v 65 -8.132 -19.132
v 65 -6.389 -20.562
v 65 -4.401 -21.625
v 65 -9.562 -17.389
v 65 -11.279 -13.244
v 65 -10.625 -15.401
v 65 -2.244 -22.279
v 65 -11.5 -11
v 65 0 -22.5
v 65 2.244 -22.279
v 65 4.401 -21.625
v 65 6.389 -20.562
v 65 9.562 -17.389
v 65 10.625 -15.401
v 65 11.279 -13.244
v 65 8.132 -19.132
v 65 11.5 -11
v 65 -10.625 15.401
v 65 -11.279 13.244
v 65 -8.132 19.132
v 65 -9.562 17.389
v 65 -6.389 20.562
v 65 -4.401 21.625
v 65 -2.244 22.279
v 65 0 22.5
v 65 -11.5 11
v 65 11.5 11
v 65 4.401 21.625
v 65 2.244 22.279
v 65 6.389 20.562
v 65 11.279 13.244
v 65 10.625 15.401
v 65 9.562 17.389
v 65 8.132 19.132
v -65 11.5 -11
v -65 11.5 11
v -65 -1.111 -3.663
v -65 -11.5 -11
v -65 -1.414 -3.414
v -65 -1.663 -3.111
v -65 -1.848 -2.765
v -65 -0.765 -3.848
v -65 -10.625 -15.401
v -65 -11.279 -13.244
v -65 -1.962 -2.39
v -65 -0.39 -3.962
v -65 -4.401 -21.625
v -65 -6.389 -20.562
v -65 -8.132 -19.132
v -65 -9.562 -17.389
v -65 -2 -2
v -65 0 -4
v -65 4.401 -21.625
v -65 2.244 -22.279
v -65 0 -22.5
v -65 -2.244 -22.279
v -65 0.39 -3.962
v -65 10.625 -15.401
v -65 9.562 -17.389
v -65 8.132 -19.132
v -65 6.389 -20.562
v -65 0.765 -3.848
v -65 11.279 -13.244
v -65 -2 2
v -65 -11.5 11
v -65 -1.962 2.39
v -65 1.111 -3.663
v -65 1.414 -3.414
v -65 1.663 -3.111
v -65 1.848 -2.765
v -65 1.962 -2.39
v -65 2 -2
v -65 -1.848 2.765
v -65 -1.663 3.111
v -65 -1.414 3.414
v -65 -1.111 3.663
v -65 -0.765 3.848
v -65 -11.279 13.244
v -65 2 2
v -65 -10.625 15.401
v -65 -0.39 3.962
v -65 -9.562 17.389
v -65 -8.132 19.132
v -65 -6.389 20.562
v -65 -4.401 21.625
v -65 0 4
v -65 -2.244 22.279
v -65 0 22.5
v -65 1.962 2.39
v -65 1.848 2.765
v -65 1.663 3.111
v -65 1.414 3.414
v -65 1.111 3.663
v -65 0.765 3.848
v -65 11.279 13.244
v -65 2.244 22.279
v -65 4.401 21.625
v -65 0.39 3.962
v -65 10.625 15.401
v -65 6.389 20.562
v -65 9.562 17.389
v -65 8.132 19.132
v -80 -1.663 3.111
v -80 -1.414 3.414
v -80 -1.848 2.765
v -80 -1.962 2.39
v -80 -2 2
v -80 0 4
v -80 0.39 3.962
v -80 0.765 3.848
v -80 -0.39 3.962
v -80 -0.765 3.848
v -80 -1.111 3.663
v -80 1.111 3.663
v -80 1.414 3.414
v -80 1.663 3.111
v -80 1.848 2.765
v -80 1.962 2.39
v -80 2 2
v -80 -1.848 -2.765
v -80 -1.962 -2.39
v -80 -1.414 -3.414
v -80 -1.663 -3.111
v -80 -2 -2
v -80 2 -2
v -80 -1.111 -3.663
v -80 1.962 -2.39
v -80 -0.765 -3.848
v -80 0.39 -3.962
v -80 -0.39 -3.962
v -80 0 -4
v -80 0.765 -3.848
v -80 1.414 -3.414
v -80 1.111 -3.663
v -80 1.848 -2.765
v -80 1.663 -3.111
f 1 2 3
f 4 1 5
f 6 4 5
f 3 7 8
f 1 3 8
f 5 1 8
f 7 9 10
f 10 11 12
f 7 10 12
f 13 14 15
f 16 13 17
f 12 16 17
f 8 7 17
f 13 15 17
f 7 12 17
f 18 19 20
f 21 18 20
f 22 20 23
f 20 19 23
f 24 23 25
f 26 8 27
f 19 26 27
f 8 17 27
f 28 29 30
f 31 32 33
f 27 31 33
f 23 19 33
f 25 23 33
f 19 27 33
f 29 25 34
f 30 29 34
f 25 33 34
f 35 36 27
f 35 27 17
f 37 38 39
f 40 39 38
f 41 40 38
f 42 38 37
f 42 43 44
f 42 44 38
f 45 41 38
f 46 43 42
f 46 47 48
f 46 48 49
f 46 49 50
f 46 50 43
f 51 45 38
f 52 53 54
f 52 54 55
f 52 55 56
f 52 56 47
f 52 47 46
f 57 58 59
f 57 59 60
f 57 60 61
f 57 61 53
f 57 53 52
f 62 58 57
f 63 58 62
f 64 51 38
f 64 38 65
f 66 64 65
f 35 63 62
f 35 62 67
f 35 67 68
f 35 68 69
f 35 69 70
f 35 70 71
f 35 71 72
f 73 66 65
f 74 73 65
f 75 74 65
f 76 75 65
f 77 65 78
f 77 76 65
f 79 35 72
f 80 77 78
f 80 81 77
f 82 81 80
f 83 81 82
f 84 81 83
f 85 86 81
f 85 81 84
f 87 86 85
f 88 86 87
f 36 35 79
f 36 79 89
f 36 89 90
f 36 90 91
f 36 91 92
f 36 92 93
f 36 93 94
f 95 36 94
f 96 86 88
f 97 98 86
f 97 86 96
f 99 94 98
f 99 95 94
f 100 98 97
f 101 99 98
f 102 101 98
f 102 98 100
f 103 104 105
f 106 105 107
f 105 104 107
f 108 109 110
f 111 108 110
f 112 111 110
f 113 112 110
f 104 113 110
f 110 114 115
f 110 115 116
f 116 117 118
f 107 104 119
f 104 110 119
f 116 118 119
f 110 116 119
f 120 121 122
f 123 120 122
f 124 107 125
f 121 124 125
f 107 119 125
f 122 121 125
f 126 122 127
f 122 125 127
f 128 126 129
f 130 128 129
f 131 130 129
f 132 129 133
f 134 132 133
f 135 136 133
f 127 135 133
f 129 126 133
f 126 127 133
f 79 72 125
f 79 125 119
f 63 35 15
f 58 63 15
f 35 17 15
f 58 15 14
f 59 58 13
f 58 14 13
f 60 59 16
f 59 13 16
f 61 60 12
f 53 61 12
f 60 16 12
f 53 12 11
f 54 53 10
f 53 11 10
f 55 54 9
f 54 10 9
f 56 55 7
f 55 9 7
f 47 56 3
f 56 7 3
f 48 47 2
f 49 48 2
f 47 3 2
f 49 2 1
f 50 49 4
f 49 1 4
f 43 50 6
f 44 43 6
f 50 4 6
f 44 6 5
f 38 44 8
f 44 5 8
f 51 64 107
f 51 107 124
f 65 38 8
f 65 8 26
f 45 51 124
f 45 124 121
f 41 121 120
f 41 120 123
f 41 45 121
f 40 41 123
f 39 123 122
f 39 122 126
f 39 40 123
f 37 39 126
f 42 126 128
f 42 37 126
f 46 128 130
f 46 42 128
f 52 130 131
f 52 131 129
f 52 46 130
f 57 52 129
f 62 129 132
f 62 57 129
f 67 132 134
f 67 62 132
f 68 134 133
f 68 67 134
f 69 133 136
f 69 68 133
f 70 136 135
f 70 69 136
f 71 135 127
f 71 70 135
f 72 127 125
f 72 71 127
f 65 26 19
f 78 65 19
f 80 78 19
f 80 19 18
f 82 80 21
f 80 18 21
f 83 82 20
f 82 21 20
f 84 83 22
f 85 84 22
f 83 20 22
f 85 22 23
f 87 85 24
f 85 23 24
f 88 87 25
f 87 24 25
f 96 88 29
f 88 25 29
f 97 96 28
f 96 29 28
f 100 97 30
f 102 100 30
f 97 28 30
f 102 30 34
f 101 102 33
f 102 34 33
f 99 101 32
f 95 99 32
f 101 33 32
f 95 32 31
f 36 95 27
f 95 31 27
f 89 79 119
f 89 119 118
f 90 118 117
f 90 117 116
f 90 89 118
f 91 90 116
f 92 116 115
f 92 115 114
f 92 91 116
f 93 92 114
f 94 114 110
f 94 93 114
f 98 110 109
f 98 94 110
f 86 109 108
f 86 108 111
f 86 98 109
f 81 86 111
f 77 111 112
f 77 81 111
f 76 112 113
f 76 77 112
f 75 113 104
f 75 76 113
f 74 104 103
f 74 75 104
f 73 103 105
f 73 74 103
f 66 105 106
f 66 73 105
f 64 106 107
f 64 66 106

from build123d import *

# Parameters (mm, degrees)
BOSS_EXTRUDE1_DEPTH      = 65
BOSS_EXTRUDE1_DEPTH_BACK = 65
BOSS_EXTRUDE2_DEPTH      = 15


with BuildPart() as part:
    # Sketch1 → Boss-Extrude1 (new, two sides: drawn at the far end of the back side and taken through both)
    with BuildSketch(Plane(origin=(0, 0, 0), x_dir=(0, 0, -1), z_dir=(1, 0, 0)).offset(-BOSS_EXTRUDE1_DEPTH_BACK)):
        with BuildLine():
            Line((-11, 11.5), (11, 11.5))
            ThreePointArc((11, 11.5), (22.5, 0), (11, -11.5))
            Line((11, -11.5), (-11, -11.5))
            ThreePointArc((-11, -11.5), (-22.5, 0), (-11, 11.5))
        make_face()
    extrude(amount=BOSS_EXTRUDE1_DEPTH + BOSS_EXTRUDE1_DEPTH_BACK)

    # Sketch2 → Boss-Extrude2 (add)
    with BuildSketch(Plane.ZY.offset(65)):
        with BuildLine():
            Line((-2, 2), (2, 2))
            ThreePointArc((2, 2), (4, 0), (2, -2))
            Line((2, -2), (-2, -2))
            ThreePointArc((-2, -2), (-4, 0), (-2, 2))
        make_face()
    extrude(amount=BOSS_EXTRUDE2_DEPTH)


solid = part.part
